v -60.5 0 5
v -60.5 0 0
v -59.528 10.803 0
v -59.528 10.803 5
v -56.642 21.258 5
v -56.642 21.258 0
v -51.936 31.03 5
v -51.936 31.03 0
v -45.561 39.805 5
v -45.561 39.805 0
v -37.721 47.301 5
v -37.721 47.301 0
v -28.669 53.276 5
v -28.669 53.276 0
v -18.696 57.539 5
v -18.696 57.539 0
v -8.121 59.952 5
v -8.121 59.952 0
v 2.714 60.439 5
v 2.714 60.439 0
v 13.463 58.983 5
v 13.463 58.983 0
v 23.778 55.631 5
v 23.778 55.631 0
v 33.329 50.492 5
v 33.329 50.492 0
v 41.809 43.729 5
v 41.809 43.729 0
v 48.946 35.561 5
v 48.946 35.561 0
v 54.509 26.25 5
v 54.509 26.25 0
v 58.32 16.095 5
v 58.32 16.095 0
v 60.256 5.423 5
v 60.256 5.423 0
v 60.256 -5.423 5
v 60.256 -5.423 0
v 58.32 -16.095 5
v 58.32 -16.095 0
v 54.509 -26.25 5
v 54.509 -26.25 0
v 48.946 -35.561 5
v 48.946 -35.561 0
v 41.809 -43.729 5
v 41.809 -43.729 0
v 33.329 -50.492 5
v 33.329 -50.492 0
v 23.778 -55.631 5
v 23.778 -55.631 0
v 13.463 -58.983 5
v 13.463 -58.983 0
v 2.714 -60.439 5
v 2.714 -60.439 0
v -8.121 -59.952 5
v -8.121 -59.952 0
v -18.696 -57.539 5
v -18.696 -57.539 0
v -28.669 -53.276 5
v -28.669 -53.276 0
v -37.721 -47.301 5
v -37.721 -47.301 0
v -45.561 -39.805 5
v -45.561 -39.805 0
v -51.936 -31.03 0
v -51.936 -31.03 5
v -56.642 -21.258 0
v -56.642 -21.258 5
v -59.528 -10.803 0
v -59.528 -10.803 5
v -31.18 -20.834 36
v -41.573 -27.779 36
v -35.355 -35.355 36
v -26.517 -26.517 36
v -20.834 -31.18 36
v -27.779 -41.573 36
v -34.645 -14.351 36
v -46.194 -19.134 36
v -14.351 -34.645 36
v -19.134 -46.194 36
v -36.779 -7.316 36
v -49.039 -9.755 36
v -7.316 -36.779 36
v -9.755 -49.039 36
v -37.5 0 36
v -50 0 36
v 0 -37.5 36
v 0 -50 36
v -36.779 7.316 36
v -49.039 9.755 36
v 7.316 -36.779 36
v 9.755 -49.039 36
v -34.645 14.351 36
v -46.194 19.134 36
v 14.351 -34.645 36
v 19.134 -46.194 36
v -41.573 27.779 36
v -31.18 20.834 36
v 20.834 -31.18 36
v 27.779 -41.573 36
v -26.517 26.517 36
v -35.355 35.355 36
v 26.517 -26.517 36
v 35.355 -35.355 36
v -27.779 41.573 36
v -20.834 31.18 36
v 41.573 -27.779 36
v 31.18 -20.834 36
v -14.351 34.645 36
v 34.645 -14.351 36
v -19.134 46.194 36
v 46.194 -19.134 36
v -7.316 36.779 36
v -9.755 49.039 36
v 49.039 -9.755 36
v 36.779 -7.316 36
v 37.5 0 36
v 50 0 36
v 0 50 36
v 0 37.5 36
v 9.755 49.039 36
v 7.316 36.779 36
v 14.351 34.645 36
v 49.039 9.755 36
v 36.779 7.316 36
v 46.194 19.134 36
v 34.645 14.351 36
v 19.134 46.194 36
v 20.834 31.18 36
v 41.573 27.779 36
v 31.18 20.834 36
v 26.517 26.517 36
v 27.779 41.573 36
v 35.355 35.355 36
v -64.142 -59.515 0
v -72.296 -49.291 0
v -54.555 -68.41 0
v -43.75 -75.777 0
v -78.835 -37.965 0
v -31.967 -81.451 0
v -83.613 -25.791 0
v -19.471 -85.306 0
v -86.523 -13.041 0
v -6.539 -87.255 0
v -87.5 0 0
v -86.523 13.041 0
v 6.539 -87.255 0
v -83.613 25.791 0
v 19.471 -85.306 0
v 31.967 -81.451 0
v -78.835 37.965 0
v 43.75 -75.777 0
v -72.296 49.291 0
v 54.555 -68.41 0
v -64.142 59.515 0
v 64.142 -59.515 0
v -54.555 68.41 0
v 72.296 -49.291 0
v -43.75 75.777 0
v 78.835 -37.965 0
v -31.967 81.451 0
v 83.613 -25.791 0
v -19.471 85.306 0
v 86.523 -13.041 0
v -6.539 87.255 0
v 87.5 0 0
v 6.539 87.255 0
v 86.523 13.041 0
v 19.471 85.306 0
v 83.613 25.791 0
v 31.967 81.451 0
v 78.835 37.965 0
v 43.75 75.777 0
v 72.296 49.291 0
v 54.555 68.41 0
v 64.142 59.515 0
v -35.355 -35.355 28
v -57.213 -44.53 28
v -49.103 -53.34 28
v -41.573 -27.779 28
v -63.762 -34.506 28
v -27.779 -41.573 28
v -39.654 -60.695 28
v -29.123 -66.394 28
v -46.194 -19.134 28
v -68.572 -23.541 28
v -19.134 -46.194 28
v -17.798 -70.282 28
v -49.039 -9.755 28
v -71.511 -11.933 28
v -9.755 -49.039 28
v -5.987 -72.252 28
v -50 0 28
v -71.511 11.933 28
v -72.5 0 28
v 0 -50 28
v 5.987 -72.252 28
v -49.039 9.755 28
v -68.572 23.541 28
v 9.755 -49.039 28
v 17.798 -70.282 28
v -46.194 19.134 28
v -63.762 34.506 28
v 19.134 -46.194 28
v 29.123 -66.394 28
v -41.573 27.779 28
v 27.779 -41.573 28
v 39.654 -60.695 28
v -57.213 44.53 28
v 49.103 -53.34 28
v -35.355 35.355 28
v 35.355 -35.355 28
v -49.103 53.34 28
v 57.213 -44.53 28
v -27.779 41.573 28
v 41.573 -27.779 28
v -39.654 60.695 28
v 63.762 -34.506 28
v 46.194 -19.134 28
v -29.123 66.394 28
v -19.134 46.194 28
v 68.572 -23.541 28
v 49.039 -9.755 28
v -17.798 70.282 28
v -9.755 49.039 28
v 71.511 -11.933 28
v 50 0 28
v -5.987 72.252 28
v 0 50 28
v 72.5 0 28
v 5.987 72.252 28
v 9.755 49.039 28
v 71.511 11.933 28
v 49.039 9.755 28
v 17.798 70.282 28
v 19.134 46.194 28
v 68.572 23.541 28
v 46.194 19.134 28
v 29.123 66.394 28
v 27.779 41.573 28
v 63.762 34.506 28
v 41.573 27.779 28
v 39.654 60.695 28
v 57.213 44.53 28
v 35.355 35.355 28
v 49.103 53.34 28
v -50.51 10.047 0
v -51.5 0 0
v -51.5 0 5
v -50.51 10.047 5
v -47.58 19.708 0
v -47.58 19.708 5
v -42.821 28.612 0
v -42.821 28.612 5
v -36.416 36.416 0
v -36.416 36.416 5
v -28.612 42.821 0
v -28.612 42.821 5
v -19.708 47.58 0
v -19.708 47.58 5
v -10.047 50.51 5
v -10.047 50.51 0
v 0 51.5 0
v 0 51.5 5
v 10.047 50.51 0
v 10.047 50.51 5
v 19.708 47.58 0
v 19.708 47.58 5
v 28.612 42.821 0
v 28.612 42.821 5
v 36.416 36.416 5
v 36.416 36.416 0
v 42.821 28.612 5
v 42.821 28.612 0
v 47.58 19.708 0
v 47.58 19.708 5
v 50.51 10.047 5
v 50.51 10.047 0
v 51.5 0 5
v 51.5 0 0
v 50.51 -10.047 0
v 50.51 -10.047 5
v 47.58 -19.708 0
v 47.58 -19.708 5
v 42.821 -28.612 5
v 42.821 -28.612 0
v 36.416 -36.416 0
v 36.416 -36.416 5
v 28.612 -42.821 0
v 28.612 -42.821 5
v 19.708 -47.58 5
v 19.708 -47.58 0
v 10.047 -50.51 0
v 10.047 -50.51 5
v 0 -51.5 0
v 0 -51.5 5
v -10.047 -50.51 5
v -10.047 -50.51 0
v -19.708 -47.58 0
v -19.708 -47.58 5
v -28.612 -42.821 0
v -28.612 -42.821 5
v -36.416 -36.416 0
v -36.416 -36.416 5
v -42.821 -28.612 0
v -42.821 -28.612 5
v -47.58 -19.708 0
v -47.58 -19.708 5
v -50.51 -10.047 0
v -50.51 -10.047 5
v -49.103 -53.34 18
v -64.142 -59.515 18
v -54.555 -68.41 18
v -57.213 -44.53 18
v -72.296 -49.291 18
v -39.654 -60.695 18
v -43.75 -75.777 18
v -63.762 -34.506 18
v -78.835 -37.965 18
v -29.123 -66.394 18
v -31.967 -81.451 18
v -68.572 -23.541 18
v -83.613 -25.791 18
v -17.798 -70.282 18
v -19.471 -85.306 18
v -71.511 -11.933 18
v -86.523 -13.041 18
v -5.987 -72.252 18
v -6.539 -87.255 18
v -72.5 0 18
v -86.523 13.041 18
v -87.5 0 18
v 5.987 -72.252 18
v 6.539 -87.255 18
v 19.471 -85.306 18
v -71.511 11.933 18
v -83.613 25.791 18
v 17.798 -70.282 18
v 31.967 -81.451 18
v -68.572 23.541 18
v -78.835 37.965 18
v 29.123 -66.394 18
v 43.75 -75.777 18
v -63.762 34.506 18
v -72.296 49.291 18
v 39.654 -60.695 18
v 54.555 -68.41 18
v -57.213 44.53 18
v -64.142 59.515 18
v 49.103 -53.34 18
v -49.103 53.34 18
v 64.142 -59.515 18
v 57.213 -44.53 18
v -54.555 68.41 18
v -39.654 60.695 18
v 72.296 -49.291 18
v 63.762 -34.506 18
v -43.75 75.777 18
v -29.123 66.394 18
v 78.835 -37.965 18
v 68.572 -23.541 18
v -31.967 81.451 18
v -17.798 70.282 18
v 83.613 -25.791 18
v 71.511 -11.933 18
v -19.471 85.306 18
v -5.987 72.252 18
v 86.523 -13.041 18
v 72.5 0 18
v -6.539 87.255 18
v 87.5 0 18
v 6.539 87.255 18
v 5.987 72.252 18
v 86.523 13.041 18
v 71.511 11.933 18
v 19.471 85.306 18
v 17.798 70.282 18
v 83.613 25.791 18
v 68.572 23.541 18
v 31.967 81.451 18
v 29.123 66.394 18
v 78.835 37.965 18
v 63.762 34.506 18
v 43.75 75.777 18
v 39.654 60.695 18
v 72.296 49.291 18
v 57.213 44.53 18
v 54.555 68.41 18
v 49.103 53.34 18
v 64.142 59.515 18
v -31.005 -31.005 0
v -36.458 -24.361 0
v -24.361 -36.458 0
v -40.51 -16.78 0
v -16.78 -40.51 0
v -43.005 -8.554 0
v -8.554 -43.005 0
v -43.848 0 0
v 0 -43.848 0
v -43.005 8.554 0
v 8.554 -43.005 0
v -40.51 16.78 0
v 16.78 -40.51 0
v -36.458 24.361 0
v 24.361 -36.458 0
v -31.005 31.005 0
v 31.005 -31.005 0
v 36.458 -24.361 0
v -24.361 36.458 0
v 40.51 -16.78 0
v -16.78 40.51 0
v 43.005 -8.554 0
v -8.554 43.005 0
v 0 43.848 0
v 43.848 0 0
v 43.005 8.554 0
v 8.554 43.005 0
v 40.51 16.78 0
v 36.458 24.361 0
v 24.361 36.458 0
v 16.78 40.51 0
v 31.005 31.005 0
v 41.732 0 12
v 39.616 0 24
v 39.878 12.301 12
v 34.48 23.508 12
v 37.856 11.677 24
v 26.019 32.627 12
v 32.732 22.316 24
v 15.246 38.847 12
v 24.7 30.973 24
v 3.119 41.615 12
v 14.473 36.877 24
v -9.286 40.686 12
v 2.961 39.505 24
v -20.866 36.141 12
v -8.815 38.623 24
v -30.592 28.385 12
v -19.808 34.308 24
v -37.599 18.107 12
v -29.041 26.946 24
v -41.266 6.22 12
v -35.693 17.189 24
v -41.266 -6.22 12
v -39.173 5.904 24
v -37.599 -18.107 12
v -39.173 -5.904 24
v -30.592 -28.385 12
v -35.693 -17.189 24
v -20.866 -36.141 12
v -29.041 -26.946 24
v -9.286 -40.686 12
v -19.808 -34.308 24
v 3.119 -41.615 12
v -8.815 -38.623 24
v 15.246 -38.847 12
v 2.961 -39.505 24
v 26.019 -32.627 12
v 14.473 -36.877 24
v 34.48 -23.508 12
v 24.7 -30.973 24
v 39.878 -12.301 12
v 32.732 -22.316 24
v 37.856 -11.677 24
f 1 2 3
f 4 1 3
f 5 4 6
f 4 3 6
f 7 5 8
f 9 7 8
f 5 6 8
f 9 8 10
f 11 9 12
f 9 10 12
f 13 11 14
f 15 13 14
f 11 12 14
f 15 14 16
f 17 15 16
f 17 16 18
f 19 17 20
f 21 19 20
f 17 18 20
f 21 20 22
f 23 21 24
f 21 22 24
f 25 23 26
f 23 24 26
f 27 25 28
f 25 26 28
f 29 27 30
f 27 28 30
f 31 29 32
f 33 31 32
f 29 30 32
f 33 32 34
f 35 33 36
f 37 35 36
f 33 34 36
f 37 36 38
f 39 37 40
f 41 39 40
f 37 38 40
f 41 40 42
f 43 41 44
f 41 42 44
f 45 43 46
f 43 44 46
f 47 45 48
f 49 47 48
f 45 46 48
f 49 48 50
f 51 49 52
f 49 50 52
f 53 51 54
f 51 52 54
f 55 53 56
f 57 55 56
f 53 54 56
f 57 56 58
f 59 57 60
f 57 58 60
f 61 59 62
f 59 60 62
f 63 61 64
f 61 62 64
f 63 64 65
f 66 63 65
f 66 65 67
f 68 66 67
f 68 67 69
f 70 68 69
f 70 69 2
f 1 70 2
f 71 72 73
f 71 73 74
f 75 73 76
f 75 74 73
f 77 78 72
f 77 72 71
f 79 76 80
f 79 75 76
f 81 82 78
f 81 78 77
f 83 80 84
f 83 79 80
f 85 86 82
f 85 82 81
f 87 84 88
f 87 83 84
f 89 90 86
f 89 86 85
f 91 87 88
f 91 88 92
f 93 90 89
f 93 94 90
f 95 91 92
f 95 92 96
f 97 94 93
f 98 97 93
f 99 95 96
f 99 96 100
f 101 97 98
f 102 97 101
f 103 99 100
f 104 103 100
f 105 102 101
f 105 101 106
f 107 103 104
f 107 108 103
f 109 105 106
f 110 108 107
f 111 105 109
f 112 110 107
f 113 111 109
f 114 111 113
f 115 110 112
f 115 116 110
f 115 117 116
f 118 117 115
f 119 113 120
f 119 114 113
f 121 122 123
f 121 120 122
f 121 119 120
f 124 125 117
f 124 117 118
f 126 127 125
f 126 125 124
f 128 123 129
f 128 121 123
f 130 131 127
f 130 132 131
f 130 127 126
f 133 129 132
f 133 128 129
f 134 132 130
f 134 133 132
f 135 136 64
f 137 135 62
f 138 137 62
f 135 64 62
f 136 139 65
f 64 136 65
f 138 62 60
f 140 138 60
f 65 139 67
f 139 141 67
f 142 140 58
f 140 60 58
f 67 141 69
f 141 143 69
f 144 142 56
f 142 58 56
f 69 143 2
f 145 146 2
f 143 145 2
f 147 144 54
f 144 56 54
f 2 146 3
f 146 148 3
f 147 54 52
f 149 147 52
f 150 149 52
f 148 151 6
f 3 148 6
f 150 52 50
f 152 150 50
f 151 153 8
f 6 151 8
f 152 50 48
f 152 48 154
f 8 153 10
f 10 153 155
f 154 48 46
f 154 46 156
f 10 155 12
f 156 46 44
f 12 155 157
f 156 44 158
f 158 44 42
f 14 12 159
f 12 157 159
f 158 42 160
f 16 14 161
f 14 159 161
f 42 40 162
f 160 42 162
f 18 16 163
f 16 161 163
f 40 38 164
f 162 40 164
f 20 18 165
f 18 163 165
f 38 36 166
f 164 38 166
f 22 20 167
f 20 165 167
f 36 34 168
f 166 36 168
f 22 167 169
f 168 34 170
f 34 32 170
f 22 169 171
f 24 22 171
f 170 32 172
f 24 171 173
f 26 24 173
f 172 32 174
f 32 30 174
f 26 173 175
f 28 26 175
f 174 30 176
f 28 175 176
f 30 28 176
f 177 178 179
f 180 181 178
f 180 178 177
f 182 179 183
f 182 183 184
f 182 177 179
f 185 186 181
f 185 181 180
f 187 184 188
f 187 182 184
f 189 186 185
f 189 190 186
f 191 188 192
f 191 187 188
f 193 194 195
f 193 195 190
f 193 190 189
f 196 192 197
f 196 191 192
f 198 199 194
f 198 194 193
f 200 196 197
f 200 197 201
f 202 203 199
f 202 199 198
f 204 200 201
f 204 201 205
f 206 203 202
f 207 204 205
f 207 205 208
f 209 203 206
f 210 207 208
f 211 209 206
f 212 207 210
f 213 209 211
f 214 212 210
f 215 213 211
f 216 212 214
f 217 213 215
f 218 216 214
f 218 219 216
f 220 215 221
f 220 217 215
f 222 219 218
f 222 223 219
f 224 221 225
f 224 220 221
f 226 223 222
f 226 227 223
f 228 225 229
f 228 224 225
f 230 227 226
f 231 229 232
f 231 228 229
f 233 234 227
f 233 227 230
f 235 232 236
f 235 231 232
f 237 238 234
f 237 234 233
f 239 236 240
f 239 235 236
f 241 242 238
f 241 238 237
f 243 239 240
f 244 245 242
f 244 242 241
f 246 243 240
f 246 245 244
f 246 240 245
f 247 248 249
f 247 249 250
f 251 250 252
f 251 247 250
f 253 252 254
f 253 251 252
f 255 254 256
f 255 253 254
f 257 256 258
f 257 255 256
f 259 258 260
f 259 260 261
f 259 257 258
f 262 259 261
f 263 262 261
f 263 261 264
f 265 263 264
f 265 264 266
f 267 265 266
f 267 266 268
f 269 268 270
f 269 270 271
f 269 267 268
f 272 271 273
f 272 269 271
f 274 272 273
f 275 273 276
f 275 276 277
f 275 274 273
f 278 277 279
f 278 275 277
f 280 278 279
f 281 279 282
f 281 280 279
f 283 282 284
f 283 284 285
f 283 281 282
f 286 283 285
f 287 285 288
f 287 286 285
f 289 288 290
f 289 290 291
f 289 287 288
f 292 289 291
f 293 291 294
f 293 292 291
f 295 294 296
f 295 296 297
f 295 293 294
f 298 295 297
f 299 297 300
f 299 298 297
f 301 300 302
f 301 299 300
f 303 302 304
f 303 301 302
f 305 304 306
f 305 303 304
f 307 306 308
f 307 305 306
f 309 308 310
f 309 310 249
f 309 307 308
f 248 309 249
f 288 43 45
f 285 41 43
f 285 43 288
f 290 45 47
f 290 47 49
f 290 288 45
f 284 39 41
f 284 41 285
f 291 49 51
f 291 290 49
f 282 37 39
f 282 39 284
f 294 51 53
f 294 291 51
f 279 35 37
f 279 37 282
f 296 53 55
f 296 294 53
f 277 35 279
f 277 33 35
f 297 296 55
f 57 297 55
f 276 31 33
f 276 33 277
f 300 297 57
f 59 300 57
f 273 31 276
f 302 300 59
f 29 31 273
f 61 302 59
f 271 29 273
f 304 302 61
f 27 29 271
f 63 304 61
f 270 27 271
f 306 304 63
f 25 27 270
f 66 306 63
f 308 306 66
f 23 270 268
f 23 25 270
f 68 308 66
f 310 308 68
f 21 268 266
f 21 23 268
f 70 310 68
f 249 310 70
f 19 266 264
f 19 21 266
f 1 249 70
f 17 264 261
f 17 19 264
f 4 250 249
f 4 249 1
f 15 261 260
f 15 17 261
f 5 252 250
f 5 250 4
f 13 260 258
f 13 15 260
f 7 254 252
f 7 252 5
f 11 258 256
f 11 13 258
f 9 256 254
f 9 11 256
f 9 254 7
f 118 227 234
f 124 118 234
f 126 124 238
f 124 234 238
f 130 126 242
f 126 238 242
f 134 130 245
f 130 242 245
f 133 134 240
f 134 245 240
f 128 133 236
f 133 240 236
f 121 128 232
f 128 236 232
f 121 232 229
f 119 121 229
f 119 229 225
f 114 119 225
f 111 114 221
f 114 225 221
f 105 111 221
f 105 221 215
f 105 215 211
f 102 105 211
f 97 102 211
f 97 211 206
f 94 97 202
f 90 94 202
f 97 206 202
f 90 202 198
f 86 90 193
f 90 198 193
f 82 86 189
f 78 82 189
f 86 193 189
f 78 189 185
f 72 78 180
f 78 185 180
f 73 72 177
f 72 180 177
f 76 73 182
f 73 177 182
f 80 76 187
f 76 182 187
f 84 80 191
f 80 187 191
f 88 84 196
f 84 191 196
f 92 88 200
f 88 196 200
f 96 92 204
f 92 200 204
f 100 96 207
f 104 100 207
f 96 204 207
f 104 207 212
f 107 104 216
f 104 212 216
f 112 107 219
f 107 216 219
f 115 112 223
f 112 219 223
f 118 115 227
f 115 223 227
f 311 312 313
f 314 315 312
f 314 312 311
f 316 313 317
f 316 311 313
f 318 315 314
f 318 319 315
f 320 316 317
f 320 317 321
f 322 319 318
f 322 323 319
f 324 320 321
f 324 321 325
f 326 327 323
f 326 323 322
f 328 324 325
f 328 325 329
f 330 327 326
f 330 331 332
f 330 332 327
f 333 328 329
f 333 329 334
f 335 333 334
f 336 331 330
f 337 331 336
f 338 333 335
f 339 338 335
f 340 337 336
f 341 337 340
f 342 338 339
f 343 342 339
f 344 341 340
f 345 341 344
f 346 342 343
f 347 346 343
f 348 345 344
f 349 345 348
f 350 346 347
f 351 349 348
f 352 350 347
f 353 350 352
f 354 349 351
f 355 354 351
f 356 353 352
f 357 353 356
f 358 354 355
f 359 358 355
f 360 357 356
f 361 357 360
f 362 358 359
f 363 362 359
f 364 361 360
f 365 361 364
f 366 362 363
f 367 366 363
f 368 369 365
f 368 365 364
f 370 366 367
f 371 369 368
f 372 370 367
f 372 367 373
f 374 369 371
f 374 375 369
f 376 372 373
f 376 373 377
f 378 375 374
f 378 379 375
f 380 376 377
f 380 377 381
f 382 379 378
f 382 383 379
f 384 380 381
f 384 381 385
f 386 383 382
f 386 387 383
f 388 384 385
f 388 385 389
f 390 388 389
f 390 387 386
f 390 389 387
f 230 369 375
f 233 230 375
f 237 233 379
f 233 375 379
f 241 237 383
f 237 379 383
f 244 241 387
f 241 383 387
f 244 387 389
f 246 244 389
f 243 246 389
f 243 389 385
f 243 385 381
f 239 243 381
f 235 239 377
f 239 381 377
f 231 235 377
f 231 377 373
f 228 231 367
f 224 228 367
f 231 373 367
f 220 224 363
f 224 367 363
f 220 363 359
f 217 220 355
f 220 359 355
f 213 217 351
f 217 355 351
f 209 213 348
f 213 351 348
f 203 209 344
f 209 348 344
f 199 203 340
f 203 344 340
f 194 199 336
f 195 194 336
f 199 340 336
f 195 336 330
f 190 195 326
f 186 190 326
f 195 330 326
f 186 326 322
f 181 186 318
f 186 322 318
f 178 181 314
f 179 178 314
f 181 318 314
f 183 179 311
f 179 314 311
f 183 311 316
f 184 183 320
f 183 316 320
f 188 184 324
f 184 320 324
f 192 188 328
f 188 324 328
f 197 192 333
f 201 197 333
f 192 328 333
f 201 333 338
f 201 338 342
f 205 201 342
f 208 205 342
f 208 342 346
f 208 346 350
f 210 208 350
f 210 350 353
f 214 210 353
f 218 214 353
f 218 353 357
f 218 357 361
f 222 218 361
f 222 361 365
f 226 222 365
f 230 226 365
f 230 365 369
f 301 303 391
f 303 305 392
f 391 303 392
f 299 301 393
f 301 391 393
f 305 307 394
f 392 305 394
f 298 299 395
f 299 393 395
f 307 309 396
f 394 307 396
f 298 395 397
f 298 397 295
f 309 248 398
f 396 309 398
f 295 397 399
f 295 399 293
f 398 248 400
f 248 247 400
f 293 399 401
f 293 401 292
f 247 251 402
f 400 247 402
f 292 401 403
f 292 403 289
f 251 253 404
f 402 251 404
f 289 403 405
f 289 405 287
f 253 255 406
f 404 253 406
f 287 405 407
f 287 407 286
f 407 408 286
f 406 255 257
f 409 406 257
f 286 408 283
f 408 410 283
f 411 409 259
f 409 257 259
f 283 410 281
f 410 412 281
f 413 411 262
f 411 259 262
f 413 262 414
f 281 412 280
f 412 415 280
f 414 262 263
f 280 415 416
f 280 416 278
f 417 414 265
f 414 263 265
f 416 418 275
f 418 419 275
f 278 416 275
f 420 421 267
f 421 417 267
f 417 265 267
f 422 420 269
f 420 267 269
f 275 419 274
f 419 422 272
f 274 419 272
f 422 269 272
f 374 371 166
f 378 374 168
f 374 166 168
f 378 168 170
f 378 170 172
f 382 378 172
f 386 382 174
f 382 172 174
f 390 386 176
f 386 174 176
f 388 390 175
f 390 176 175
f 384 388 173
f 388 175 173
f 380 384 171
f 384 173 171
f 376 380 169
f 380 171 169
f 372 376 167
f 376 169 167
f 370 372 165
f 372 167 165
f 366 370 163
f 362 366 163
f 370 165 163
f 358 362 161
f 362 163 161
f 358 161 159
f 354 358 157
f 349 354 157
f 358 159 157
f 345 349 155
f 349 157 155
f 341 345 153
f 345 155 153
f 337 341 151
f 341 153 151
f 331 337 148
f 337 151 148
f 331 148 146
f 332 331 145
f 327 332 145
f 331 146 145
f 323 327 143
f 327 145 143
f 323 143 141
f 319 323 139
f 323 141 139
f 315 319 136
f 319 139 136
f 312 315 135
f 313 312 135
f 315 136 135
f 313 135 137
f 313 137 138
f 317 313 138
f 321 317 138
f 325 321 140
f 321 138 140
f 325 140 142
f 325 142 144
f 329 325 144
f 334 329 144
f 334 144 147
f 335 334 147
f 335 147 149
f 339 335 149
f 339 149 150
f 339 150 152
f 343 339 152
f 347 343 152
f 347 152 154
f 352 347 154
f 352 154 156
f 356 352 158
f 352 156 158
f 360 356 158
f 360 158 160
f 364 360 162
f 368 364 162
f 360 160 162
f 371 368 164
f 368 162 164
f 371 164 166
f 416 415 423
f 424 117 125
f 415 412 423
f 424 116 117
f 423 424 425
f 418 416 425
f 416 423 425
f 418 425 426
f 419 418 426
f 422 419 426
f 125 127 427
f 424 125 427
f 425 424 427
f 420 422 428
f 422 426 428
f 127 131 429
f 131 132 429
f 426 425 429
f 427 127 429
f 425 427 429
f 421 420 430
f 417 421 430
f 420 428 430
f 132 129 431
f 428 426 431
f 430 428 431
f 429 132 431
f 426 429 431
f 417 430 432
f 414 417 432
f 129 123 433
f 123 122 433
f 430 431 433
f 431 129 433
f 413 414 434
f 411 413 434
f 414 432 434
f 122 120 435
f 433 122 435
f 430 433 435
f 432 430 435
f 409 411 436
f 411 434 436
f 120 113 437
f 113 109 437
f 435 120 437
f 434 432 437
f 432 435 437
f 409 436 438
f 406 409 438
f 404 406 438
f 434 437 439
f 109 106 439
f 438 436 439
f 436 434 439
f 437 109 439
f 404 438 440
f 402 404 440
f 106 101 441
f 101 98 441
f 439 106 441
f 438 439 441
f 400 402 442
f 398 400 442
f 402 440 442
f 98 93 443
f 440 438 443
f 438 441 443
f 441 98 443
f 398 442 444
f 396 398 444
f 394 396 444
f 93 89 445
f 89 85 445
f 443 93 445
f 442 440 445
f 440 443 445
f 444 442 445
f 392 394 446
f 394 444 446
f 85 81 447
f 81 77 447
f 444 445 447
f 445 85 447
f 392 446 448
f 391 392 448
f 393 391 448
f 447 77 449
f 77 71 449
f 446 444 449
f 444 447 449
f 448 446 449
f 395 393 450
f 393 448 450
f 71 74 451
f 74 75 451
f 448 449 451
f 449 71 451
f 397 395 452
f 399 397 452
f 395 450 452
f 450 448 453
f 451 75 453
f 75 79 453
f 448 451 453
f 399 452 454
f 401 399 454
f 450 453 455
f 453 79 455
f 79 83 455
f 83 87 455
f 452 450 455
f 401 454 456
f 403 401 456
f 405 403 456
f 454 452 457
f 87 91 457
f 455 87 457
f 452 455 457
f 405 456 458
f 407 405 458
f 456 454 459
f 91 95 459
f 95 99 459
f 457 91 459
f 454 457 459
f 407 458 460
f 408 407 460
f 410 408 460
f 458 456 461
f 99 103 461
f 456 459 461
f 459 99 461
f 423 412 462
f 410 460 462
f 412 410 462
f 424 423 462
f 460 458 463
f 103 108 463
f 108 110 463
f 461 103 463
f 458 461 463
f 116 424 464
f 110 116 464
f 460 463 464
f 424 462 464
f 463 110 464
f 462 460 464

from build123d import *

# Parameters (mm, degrees)
SKETCH_1_R          = 87.5
EXTRUDE_1_DEPTH     = 18
SKETCH_2_R          = 72.5
EXTRUDE_2_DEPTH     = 10
SKETCH_3_R          = 50
EXTRUDE_3_DEPTH     = 8
SKETCH_4_R          = 60.5
SKETCH_4_R_2        = 51.5
CUT_EXTRUDE_1_DEPTH = 5
SKETCH_5_R          = 37.5
CUT_EXTRUDE_2_DEPTH = 129.873969443
CUT_EXTRUDE_2_DRAFT = 10


with BuildPart() as part:
    # 草图1 → 凸台-拉伸1 (new body)
    with BuildSketch(Plane.XY):
        Circle(SKETCH_1_R)
    extrude(amount=EXTRUDE_1_DEPTH)

    # 草图2 → 凸台-拉伸2 (add)
    with BuildSketch(Plane.XY.offset(18)):
        Circle(SKETCH_2_R)
    extrude(amount=EXTRUDE_2_DEPTH)

    # 草图3 → 凸台-拉伸3 (add)
    with BuildSketch(Plane.XY.offset(28)):
        Circle(SKETCH_3_R)
    extrude(amount=EXTRUDE_3_DEPTH)

    # 草图4 → 切除-拉伸1 (cut)
    with BuildSketch(Plane(origin=(0, 0, 0), x_dir=(-1, 0, 0), z_dir=(0, 0, -1))):
        Circle(SKETCH_4_R)
        Circle(SKETCH_4_R_2, mode=Mode.SUBTRACT)
    extrude(amount=-CUT_EXTRUDE_1_DEPTH, mode=Mode.SUBTRACT)


with BuildPart() as cut_extrude_2_tool:
    # 草图5 → 切除-拉伸2 (with draft: the straight prism first)
    with BuildSketch(Plane.XY.offset(36)):
        Circle(SKETCH_5_R)
    extrude(amount=-CUT_EXTRUDE_2_DEPTH)
    # 切除-拉伸2: the draft: its side faces are tilted about the plane it starts from
    cut_extrude_2_sides = [cut_extrude_2_tool.faces().sort_by_distance(p)[0] for p in [
        (-37.5, 0, -28.936984722),
    ]]
    draft(cut_extrude_2_sides, Plane.XY.offset(36), CUT_EXTRUDE_2_DRAFT)


with BuildPart() as part_1:
    add(part.part)

    # 切除-拉伸2: cut by cut_extrude_2_tool
    add(cut_extrude_2_tool.part, mode=Mode.SUBTRACT)


solid = part_1.part
